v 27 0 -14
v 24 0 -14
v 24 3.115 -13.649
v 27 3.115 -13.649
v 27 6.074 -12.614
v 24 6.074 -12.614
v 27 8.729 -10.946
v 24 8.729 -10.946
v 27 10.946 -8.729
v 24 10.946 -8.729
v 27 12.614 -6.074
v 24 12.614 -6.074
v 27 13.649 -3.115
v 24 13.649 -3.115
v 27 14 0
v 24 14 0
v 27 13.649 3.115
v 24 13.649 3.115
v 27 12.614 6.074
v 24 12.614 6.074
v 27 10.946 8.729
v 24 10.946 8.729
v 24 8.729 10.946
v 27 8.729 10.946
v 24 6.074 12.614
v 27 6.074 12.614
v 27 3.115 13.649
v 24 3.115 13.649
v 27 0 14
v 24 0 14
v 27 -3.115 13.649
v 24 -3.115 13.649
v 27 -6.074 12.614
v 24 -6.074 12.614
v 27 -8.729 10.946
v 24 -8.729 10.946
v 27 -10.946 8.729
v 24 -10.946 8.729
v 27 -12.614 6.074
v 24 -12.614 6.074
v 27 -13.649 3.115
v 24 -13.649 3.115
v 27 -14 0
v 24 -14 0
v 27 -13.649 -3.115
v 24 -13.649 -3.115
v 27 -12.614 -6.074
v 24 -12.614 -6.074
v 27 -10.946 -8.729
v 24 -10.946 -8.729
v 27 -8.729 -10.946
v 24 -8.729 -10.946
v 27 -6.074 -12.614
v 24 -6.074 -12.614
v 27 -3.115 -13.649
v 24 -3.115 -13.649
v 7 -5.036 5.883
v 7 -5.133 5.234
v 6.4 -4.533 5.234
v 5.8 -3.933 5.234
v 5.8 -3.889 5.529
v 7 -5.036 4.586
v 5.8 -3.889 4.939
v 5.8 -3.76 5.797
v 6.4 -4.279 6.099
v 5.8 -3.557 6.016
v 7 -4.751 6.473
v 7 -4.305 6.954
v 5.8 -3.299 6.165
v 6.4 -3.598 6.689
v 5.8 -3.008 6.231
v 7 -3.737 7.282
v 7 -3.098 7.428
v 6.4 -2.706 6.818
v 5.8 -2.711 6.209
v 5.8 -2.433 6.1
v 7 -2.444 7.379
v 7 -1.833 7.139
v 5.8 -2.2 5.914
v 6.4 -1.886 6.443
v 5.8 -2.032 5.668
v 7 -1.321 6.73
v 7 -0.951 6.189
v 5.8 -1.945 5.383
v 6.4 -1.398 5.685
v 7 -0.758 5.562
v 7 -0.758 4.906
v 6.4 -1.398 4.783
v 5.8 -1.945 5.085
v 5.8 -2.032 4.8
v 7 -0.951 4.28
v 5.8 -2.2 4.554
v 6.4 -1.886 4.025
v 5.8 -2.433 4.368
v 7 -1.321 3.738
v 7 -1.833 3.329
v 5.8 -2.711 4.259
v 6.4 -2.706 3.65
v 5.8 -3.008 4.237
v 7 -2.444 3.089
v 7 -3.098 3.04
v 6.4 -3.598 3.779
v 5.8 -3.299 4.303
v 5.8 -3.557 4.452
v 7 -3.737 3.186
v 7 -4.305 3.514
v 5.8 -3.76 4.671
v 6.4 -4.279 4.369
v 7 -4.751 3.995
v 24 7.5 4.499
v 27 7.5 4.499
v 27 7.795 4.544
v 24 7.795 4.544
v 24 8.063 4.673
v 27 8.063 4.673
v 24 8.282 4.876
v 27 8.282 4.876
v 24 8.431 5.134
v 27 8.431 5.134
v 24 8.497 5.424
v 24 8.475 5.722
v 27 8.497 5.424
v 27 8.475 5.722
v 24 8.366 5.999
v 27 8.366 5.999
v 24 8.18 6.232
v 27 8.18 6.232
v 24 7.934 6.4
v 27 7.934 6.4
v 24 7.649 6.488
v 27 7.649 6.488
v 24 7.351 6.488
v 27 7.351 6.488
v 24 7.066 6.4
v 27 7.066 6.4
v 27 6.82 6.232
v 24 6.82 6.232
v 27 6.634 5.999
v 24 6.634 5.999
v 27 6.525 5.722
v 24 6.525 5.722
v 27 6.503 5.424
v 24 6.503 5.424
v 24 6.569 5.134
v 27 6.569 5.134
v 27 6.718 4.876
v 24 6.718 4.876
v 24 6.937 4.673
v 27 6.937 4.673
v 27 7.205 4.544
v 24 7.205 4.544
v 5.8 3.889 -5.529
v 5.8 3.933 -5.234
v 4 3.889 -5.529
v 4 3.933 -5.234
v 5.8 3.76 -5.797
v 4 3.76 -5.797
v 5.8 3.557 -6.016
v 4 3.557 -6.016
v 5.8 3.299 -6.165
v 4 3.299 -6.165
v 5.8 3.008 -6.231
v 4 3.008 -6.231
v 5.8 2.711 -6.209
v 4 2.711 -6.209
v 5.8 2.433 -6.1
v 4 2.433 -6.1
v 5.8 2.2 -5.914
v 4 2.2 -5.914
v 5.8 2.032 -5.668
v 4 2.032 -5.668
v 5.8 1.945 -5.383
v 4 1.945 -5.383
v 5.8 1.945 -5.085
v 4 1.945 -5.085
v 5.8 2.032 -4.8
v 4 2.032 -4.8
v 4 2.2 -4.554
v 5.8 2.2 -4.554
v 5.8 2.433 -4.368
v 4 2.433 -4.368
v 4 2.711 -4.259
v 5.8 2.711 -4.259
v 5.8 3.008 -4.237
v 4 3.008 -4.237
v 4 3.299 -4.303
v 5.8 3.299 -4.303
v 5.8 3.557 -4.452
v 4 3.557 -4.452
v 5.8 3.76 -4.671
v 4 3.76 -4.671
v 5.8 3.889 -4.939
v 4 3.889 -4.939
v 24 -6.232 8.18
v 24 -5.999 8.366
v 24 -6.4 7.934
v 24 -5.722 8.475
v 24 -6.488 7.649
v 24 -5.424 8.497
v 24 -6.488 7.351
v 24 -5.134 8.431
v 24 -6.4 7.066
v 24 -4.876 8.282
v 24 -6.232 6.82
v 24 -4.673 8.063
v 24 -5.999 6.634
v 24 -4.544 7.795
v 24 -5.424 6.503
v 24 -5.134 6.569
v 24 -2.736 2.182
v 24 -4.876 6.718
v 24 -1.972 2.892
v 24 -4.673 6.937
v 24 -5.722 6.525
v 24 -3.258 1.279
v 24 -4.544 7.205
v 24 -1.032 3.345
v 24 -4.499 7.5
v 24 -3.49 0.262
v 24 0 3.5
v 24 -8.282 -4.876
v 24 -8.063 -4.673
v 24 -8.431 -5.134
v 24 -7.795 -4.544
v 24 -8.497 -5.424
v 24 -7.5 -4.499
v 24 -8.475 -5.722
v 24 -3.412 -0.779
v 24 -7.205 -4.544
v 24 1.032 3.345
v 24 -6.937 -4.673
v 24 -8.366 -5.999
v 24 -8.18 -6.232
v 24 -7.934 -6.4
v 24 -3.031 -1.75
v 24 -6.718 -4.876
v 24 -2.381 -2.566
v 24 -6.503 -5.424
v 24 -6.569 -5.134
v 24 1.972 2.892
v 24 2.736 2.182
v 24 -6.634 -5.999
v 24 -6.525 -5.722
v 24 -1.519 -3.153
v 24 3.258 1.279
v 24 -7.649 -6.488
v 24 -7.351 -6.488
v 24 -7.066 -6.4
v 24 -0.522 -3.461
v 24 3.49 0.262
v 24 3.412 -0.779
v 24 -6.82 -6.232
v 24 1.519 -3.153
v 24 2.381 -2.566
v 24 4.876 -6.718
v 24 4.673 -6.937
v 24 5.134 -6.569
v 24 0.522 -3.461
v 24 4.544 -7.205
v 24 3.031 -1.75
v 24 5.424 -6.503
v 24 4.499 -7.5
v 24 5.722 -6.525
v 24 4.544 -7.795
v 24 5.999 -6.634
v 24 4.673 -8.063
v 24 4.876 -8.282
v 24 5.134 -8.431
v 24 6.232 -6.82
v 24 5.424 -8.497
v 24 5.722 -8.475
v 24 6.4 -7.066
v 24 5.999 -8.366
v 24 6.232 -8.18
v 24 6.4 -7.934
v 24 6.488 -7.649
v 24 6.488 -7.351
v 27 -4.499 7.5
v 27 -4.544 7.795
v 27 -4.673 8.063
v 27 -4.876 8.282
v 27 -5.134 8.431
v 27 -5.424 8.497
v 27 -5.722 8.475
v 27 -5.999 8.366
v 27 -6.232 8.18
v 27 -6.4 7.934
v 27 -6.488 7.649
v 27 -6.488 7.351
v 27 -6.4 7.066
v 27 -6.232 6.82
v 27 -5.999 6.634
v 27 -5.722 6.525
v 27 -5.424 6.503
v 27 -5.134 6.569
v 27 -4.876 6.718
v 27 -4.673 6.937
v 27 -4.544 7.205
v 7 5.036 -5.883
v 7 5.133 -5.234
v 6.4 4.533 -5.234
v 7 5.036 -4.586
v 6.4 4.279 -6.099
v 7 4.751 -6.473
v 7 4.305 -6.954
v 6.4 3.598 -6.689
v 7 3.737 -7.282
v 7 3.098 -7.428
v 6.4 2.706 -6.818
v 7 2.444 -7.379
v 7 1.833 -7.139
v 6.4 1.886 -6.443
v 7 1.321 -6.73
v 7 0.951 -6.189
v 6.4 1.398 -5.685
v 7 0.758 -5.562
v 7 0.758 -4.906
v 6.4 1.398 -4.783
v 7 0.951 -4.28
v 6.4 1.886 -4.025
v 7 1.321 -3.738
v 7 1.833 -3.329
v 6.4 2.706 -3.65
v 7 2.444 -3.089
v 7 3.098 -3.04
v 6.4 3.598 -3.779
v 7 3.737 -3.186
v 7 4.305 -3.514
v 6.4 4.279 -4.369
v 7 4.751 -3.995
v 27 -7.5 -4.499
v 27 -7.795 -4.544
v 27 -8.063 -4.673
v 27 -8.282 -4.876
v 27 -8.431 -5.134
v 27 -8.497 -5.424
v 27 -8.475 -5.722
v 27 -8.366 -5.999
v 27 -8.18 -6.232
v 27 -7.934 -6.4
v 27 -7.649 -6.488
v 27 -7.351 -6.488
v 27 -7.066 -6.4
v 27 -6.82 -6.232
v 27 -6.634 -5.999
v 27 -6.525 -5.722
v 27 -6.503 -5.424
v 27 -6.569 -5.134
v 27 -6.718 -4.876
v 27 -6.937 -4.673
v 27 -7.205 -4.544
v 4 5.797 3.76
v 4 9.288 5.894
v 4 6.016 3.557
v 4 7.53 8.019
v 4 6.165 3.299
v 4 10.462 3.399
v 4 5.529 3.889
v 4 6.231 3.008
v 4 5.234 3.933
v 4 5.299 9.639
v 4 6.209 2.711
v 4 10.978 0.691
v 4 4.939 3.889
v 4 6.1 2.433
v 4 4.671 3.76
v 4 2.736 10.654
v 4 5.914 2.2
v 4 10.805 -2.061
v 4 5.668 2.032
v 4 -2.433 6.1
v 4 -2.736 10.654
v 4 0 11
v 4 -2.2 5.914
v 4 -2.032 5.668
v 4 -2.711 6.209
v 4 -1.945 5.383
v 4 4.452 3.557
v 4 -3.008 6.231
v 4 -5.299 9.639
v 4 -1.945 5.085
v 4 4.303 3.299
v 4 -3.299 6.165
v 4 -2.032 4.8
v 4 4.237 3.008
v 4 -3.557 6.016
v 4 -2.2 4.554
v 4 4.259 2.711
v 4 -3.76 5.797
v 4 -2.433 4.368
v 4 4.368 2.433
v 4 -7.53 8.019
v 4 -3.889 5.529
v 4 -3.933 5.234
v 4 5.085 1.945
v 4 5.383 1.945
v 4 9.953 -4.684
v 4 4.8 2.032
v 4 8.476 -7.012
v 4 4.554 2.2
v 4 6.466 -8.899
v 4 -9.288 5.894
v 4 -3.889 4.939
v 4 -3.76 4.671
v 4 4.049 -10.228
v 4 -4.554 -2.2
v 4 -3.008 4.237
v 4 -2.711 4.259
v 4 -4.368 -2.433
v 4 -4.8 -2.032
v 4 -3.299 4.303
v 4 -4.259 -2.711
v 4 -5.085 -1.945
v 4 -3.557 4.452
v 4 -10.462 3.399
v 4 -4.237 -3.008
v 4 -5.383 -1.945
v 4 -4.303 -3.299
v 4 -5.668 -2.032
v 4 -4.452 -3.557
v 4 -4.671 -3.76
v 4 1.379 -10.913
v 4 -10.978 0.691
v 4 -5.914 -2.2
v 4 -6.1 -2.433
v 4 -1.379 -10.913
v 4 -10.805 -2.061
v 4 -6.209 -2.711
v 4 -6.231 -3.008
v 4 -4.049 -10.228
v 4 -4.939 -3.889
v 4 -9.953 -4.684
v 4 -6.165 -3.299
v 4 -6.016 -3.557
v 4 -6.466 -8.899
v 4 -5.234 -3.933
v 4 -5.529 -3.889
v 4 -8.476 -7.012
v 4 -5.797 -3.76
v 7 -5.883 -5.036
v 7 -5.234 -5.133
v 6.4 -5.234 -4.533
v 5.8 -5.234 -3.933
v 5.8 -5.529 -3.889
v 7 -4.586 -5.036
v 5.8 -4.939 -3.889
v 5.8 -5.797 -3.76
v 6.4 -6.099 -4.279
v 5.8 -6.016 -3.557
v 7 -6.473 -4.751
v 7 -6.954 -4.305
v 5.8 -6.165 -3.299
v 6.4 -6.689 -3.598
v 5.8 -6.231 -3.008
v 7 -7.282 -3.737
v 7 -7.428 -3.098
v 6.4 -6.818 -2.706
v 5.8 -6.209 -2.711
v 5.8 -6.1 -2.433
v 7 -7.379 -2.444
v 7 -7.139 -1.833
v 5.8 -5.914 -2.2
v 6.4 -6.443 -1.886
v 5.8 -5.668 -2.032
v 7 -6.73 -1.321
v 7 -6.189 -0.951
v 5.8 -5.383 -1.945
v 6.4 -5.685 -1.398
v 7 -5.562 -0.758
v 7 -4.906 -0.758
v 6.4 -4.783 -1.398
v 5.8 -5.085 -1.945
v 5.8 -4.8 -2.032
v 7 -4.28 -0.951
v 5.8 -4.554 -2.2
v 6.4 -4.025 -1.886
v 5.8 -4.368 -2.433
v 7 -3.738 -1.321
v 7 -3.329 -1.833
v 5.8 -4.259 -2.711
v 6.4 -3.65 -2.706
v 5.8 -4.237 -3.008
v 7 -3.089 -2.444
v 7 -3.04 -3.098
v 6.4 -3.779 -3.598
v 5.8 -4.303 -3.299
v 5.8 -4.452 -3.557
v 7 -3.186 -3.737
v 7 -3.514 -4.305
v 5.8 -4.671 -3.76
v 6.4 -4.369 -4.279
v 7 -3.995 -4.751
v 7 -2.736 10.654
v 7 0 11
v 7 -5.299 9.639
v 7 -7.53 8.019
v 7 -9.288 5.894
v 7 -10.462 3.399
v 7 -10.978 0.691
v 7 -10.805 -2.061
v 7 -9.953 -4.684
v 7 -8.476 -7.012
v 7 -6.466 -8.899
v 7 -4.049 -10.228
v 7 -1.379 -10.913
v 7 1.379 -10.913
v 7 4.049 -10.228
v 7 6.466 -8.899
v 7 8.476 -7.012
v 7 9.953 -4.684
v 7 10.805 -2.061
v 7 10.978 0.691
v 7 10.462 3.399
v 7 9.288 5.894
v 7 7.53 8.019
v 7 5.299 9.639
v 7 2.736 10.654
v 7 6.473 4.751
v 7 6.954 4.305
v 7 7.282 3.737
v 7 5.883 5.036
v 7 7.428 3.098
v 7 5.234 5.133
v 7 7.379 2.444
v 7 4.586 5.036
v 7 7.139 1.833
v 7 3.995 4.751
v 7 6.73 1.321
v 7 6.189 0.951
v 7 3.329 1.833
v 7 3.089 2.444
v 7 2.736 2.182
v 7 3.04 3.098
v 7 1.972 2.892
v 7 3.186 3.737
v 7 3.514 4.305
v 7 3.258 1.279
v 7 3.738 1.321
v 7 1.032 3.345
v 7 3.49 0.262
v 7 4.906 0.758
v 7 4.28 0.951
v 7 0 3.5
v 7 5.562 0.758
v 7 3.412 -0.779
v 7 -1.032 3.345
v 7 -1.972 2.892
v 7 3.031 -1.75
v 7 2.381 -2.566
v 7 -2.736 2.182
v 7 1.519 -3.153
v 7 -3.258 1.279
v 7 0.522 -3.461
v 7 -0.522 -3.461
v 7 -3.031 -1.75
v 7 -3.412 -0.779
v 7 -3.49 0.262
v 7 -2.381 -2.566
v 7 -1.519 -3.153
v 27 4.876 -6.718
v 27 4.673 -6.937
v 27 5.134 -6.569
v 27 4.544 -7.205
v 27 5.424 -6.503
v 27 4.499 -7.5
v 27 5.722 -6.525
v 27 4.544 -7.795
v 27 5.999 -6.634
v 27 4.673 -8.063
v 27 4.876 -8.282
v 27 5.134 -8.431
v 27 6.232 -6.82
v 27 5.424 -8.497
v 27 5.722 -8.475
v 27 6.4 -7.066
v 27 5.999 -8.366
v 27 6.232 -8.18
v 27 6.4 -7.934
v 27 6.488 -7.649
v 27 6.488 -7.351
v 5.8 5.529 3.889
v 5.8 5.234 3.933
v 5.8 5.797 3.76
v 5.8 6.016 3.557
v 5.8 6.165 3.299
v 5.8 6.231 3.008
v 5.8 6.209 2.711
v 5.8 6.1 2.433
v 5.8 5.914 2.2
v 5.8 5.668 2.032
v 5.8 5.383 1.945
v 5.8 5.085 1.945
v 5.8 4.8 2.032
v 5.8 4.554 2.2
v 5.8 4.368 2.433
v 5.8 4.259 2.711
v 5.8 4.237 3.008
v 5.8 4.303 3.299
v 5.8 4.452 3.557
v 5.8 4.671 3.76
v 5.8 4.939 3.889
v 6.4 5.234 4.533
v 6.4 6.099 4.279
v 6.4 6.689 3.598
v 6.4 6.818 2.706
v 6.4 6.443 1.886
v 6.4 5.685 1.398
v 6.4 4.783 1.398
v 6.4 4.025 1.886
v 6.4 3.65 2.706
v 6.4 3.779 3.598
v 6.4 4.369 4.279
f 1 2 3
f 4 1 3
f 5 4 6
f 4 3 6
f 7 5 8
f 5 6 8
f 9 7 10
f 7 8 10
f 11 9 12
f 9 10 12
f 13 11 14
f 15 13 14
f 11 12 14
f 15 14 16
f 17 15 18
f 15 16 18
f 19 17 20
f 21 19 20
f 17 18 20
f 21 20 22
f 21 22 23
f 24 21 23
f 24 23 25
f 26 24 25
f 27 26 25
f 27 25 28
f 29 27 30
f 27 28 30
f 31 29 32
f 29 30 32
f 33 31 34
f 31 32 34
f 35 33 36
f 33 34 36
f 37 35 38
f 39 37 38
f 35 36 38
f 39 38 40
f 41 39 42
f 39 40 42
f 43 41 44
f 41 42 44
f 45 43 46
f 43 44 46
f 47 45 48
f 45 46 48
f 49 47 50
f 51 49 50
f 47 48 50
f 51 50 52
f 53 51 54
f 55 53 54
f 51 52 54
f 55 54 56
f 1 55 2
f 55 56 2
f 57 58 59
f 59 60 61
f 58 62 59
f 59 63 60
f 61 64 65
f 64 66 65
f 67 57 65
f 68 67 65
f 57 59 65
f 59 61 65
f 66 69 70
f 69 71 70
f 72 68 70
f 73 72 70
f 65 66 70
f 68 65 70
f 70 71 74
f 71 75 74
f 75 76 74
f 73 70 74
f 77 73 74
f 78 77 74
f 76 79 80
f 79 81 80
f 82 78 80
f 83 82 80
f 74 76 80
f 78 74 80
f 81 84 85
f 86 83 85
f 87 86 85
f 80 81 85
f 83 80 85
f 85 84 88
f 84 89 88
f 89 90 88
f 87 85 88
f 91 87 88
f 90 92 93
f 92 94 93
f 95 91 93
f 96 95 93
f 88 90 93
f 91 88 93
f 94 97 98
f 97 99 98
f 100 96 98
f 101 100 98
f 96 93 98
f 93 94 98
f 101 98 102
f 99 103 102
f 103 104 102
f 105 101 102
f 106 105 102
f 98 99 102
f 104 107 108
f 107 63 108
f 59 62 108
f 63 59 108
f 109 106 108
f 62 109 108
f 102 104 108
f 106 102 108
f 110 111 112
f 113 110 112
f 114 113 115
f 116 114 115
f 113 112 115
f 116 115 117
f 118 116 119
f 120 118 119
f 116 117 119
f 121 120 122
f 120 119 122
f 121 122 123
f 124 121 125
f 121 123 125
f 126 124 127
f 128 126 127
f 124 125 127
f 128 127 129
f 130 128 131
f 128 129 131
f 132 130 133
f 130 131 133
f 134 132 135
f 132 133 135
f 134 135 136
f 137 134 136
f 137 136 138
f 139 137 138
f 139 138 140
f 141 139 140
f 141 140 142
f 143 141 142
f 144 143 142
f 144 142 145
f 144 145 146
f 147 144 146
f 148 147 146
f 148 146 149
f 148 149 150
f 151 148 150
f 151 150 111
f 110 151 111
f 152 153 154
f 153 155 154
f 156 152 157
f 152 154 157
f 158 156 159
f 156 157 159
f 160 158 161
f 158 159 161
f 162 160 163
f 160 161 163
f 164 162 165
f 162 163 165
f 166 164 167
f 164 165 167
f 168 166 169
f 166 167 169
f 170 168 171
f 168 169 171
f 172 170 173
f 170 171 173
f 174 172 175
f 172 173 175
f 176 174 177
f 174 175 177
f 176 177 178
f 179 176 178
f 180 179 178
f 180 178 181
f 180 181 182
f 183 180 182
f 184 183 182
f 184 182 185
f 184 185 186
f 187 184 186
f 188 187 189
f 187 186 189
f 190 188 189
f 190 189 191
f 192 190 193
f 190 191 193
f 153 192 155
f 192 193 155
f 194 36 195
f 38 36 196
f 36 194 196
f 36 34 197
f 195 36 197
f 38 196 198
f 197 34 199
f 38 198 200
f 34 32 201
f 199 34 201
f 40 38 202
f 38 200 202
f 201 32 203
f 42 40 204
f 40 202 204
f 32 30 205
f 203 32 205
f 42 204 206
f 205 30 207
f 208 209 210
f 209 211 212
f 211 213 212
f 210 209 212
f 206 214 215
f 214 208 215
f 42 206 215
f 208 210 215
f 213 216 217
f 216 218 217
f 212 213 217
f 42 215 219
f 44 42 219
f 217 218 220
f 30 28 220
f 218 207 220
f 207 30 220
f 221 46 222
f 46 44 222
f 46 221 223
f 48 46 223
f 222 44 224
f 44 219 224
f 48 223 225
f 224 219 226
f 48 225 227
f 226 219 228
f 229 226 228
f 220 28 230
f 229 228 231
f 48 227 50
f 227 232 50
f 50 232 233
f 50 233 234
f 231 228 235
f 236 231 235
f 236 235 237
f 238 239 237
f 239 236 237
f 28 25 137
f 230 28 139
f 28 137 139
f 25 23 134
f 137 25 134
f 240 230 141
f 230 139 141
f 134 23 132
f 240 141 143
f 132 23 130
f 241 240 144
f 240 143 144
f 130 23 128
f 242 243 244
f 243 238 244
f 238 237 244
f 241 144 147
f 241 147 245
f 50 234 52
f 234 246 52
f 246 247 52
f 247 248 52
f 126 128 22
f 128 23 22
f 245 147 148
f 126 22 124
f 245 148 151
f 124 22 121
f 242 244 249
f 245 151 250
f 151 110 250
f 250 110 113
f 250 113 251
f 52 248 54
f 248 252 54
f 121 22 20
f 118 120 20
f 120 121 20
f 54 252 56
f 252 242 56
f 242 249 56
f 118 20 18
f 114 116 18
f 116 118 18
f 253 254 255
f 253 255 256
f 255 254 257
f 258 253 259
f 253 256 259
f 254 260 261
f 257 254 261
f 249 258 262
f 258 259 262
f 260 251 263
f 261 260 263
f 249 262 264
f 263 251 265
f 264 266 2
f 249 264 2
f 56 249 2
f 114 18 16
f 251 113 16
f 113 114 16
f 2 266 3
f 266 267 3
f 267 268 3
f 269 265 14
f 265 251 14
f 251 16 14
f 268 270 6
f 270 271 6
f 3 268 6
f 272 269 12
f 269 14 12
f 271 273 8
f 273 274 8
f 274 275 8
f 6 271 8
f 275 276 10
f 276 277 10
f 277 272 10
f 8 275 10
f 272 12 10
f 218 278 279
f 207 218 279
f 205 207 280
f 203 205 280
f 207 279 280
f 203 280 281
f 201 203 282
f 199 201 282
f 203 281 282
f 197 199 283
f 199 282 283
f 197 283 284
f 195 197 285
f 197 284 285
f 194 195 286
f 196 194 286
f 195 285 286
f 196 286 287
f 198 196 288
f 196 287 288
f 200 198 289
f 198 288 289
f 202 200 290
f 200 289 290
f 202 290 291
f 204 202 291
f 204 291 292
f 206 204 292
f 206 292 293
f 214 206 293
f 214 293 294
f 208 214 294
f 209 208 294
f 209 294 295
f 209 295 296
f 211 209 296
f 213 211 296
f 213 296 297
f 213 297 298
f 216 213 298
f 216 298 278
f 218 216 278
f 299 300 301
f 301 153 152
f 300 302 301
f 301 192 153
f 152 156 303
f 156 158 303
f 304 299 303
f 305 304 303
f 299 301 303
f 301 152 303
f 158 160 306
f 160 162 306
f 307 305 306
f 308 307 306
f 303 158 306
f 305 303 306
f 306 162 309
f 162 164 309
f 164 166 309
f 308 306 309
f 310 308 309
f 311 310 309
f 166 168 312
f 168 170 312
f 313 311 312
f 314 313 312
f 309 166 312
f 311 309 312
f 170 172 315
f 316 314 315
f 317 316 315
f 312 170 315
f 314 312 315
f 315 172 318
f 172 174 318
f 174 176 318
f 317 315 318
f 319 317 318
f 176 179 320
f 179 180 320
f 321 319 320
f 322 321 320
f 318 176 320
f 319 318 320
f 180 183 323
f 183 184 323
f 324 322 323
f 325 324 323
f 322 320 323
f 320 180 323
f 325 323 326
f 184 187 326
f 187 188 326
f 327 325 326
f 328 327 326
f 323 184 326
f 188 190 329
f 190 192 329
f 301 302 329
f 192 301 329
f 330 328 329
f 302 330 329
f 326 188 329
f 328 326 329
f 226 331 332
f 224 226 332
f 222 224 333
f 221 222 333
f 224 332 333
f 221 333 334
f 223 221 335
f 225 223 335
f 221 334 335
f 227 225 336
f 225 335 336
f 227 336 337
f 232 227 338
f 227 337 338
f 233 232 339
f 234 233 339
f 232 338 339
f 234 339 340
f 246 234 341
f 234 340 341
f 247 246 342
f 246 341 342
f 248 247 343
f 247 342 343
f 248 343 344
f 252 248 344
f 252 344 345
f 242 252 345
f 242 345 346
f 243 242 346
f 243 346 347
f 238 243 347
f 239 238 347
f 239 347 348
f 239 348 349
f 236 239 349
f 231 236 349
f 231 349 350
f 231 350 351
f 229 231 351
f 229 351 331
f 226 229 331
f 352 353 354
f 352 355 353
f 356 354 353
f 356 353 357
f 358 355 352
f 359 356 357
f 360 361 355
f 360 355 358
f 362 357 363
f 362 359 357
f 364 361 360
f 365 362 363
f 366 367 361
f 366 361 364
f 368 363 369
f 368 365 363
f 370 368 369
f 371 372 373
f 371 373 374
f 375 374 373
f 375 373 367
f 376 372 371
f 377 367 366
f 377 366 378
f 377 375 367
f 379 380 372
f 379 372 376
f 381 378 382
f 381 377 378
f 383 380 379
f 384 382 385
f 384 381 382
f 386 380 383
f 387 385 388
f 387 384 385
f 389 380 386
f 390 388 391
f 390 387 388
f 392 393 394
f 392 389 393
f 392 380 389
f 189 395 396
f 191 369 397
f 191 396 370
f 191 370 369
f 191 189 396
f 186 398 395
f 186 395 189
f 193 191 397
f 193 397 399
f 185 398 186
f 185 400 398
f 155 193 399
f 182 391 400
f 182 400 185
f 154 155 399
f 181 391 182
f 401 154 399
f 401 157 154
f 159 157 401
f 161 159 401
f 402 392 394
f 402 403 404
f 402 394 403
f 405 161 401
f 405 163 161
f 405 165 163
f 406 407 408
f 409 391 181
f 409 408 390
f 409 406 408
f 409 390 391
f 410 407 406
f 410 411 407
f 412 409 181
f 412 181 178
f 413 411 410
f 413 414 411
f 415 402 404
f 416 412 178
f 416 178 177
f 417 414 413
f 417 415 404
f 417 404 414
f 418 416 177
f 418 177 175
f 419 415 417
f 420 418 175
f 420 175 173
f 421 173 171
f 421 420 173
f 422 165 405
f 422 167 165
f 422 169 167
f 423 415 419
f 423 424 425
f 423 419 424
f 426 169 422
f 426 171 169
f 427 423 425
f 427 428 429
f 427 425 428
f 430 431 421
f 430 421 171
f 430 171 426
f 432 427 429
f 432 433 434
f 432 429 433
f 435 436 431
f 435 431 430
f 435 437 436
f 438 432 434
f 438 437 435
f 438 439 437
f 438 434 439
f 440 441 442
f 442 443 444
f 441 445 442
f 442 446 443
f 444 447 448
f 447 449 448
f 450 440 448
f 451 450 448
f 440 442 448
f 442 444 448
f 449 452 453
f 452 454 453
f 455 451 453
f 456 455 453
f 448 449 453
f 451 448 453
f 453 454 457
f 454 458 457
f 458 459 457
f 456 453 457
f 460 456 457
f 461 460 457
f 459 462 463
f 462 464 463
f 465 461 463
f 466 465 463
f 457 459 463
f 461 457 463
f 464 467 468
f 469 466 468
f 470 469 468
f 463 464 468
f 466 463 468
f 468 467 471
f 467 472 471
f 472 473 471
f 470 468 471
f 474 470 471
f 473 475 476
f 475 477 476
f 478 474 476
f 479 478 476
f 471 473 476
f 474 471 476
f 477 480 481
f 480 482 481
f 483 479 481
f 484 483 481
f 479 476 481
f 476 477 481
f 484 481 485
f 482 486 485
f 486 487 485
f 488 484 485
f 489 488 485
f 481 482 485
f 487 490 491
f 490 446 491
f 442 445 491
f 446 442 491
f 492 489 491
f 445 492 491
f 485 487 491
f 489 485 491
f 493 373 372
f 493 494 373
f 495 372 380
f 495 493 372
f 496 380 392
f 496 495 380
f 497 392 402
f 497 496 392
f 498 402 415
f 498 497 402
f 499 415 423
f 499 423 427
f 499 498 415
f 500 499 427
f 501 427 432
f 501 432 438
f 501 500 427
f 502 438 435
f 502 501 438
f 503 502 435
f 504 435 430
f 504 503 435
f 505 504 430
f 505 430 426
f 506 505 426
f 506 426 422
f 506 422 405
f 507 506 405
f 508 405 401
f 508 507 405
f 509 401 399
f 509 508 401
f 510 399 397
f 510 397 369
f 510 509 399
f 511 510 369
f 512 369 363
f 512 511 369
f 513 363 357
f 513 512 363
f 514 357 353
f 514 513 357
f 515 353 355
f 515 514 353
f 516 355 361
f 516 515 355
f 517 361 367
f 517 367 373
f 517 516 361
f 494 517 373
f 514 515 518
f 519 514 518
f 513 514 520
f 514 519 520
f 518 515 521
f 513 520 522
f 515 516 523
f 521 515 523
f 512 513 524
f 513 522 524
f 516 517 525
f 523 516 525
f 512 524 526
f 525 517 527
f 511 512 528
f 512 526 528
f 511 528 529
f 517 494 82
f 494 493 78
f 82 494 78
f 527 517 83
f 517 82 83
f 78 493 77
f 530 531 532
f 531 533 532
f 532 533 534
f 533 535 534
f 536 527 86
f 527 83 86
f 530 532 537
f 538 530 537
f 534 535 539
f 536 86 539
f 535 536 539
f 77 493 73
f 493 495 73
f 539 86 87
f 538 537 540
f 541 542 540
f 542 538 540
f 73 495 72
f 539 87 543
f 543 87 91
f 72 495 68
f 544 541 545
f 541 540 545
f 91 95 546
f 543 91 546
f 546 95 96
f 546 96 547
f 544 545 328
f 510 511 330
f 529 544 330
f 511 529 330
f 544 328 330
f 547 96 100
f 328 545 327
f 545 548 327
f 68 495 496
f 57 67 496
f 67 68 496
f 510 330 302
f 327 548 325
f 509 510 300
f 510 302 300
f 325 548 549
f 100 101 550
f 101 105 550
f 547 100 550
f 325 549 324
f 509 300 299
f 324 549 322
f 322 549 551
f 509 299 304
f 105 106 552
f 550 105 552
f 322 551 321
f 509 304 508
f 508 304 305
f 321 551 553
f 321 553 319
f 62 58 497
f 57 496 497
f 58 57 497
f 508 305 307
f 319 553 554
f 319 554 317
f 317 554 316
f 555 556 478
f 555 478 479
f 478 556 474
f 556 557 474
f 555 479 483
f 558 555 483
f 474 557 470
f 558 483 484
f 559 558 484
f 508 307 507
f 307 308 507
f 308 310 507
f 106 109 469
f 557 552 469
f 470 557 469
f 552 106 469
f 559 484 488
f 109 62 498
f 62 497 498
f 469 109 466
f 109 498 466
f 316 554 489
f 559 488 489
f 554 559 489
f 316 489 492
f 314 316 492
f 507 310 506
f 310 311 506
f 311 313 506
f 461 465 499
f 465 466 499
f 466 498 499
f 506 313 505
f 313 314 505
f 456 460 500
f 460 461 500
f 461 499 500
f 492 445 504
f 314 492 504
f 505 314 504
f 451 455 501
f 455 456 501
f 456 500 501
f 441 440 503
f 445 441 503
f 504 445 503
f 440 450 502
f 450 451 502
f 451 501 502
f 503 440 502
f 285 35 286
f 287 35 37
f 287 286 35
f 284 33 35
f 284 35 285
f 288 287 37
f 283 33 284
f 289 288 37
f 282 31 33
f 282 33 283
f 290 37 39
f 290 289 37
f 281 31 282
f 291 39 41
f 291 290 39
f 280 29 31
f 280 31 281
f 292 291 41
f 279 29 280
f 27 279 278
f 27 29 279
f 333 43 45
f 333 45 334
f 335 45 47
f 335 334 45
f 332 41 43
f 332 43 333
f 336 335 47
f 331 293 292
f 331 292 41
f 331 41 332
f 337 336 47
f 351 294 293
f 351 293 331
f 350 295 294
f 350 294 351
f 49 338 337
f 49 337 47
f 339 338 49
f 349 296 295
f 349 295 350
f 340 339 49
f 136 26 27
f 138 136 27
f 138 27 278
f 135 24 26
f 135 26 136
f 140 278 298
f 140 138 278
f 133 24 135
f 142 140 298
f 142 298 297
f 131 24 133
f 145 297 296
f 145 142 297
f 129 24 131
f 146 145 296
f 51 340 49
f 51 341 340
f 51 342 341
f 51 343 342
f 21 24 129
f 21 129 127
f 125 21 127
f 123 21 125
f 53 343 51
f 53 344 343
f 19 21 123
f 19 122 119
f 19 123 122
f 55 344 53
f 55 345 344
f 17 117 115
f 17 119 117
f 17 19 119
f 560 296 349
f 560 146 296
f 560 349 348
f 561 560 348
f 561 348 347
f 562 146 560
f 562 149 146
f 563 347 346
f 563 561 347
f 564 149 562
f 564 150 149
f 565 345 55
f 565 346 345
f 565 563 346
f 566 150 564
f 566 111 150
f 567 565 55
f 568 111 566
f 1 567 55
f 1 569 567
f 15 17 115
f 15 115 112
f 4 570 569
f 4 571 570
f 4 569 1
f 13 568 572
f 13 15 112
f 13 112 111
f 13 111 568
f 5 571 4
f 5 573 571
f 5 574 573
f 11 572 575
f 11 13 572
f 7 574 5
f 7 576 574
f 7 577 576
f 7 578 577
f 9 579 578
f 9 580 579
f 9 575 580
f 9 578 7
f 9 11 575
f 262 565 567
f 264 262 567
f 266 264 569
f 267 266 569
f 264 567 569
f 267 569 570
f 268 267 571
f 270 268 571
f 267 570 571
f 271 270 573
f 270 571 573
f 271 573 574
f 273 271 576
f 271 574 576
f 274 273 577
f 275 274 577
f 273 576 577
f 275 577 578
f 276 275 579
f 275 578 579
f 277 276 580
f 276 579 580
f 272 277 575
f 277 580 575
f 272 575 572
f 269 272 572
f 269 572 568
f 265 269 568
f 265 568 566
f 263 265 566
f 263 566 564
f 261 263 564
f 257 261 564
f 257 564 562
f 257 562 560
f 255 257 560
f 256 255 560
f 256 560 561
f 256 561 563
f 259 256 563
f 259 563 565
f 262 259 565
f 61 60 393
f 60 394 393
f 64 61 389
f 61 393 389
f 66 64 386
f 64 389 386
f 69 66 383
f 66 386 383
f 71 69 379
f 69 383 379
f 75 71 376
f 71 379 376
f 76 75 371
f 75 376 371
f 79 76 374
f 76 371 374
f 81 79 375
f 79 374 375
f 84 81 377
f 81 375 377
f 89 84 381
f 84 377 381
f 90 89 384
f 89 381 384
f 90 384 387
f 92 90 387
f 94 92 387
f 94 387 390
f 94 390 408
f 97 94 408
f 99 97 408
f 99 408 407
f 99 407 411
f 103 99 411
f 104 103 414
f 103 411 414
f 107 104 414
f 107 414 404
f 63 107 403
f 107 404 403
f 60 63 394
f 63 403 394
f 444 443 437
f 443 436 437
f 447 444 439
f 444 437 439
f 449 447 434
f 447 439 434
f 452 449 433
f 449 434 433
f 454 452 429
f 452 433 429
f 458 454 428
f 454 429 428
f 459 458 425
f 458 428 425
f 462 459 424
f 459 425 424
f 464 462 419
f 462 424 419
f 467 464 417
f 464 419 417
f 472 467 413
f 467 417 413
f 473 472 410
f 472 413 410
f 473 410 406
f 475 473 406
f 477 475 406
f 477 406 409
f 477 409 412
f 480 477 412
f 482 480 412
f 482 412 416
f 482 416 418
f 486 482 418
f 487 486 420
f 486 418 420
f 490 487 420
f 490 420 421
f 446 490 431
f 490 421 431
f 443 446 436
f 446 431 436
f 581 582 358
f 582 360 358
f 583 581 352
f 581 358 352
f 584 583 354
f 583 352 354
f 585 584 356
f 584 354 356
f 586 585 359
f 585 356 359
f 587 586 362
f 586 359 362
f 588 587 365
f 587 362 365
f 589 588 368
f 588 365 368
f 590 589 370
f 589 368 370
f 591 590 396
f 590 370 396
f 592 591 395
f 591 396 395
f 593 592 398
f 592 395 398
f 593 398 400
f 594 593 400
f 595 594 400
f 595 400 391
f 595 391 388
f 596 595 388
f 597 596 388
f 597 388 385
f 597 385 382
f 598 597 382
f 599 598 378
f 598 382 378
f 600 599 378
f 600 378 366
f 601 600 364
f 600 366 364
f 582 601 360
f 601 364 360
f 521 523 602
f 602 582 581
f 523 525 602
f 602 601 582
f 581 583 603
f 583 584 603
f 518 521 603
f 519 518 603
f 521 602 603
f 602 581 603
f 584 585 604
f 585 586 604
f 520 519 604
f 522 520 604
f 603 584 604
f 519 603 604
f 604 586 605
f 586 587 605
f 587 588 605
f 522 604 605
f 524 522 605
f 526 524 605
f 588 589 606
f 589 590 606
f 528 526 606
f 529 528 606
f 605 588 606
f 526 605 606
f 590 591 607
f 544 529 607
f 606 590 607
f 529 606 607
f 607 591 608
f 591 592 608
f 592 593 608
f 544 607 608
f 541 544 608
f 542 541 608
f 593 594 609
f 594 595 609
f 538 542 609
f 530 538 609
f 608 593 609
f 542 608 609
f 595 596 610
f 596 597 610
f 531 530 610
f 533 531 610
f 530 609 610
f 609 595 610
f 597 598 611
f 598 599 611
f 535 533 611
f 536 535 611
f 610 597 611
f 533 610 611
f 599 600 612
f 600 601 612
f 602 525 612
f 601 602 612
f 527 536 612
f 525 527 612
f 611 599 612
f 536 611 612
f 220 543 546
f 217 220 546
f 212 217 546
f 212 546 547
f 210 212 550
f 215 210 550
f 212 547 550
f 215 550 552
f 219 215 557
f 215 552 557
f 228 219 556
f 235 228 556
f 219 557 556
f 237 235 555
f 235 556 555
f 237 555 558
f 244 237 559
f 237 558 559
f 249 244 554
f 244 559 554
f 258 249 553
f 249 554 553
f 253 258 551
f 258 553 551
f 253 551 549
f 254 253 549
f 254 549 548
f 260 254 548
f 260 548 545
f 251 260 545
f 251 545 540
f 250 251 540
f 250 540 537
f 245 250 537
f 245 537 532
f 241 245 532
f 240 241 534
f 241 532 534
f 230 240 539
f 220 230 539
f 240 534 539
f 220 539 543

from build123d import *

# Parameters (mm, degrees)
SKETCH_1_W                  = 3
SKETCH_1_H                  = 11
HOLE_WIZARD_M22_D           = 2
HOLE_WIZARD_M22_CSINK_D     = 4.4
HOLE_WIZARD_M22_CSINK_ANGLE = 90
PATTERN_CIRCULAR_2_COUNT    = 4
SKETCH_6_R                  = 3.5
EXTRUDE_1_DEPTH             = 17
SKETCH_7_R                  = 14
EXTRUDE_2_DEPTH             = 3
CUT_EXTRUDE_1_REACH         = 32.348
SKETCH_8_R                  = 1
PATTERN_CIRCULAR_3_COUNT    = 4


with BuildPart() as part:
    # Эскиз1 → Повернуть1 (revolve)
    with BuildSketch(Plane.XY):
        with Locations((5.5, 5.5)):
            Rectangle(SKETCH_1_W, SKETCH_1_H)
    revolve(axis=Axis((0, 0, 0), (1, 0, 0)))

    # Зенковка для  винта с плоской головкой M22 (through all)
    with Locations(Plane(origin=(7, 0, 0), x_dir=(0, 0, -1), z_dir=(1, 0, 0))):
        with Locations((-2.933383142, 5.234048466)):
            hole_wizard_m22 = CounterSinkHole(HOLE_WIZARD_M22_D / 2, HOLE_WIZARD_M22_CSINK_D / 2, counter_sink_angle=HOLE_WIZARD_M22_CSINK_ANGLE)

    # Круговой массив2: Зенковка для  винта с плоской головкой M22 ×4 about axis
    pattern_circular_2_axis = Axis((7, 0, 0), (-1, 0, 0))
    for i in range(1, PATTERN_CIRCULAR_2_COUNT):
        add(hole_wizard_m22.rotate(pattern_circular_2_axis, i * 360 / PATTERN_CIRCULAR_2_COUNT), mode=Mode.SUBTRACT)

    # Эскиз6 → Бобышка-Вытянуть1 (add)
    with BuildSketch(Plane(origin=(7, 0, 0), x_dir=(0, 0, -1), z_dir=(1, 0, 0))):
        Circle(SKETCH_6_R)
    extrude(amount=EXTRUDE_1_DEPTH)

    # Эскиз7 → Бобышка-Вытянуть2 (add)
    with BuildSketch(Plane(origin=(24, 0, 0), x_dir=(0, 0, -1), z_dir=(1, 0, 0))):
        Circle(SKETCH_7_R)
    extrude(amount=EXTRUDE_2_DEPTH)

    # Эскиз8 → Вырез-Вытянуть1 (cut, up to next)
    with BuildSketch(Plane(origin=(27, 0, 0), x_dir=(0, 0, -1), z_dir=(1, 0, 0)), mode=Mode.PRIVATE) as cut_extrude_1_sk1:
        with Locations((-5.499090834, 7.5)):
            Circle(SKETCH_8_R)
    cut_extrude_1_tool1 = extrude(cut_extrude_1_sk1.sketch, amount=-CUT_EXTRUDE_1_REACH, mode=Mode.PRIVATE) & part.part
    cut_extrude_1 = cut_extrude_1_tool1.solids().sort_by_distance((27, 7.5, 5.499091))[0]
    add(cut_extrude_1, mode=Mode.SUBTRACT)

    # Круговой массив3: Вырез-Вытянуть1 ×4 about axis
    pattern_circular_3_axis = Axis((7, 0, 0), (-1, 0, 0))
    for i in range(1, PATTERN_CIRCULAR_3_COUNT):
        add(cut_extrude_1.rotate(pattern_circular_3_axis, i * 360 / PATTERN_CIRCULAR_3_COUNT), mode=Mode.SUBTRACT)


solid = part.part
